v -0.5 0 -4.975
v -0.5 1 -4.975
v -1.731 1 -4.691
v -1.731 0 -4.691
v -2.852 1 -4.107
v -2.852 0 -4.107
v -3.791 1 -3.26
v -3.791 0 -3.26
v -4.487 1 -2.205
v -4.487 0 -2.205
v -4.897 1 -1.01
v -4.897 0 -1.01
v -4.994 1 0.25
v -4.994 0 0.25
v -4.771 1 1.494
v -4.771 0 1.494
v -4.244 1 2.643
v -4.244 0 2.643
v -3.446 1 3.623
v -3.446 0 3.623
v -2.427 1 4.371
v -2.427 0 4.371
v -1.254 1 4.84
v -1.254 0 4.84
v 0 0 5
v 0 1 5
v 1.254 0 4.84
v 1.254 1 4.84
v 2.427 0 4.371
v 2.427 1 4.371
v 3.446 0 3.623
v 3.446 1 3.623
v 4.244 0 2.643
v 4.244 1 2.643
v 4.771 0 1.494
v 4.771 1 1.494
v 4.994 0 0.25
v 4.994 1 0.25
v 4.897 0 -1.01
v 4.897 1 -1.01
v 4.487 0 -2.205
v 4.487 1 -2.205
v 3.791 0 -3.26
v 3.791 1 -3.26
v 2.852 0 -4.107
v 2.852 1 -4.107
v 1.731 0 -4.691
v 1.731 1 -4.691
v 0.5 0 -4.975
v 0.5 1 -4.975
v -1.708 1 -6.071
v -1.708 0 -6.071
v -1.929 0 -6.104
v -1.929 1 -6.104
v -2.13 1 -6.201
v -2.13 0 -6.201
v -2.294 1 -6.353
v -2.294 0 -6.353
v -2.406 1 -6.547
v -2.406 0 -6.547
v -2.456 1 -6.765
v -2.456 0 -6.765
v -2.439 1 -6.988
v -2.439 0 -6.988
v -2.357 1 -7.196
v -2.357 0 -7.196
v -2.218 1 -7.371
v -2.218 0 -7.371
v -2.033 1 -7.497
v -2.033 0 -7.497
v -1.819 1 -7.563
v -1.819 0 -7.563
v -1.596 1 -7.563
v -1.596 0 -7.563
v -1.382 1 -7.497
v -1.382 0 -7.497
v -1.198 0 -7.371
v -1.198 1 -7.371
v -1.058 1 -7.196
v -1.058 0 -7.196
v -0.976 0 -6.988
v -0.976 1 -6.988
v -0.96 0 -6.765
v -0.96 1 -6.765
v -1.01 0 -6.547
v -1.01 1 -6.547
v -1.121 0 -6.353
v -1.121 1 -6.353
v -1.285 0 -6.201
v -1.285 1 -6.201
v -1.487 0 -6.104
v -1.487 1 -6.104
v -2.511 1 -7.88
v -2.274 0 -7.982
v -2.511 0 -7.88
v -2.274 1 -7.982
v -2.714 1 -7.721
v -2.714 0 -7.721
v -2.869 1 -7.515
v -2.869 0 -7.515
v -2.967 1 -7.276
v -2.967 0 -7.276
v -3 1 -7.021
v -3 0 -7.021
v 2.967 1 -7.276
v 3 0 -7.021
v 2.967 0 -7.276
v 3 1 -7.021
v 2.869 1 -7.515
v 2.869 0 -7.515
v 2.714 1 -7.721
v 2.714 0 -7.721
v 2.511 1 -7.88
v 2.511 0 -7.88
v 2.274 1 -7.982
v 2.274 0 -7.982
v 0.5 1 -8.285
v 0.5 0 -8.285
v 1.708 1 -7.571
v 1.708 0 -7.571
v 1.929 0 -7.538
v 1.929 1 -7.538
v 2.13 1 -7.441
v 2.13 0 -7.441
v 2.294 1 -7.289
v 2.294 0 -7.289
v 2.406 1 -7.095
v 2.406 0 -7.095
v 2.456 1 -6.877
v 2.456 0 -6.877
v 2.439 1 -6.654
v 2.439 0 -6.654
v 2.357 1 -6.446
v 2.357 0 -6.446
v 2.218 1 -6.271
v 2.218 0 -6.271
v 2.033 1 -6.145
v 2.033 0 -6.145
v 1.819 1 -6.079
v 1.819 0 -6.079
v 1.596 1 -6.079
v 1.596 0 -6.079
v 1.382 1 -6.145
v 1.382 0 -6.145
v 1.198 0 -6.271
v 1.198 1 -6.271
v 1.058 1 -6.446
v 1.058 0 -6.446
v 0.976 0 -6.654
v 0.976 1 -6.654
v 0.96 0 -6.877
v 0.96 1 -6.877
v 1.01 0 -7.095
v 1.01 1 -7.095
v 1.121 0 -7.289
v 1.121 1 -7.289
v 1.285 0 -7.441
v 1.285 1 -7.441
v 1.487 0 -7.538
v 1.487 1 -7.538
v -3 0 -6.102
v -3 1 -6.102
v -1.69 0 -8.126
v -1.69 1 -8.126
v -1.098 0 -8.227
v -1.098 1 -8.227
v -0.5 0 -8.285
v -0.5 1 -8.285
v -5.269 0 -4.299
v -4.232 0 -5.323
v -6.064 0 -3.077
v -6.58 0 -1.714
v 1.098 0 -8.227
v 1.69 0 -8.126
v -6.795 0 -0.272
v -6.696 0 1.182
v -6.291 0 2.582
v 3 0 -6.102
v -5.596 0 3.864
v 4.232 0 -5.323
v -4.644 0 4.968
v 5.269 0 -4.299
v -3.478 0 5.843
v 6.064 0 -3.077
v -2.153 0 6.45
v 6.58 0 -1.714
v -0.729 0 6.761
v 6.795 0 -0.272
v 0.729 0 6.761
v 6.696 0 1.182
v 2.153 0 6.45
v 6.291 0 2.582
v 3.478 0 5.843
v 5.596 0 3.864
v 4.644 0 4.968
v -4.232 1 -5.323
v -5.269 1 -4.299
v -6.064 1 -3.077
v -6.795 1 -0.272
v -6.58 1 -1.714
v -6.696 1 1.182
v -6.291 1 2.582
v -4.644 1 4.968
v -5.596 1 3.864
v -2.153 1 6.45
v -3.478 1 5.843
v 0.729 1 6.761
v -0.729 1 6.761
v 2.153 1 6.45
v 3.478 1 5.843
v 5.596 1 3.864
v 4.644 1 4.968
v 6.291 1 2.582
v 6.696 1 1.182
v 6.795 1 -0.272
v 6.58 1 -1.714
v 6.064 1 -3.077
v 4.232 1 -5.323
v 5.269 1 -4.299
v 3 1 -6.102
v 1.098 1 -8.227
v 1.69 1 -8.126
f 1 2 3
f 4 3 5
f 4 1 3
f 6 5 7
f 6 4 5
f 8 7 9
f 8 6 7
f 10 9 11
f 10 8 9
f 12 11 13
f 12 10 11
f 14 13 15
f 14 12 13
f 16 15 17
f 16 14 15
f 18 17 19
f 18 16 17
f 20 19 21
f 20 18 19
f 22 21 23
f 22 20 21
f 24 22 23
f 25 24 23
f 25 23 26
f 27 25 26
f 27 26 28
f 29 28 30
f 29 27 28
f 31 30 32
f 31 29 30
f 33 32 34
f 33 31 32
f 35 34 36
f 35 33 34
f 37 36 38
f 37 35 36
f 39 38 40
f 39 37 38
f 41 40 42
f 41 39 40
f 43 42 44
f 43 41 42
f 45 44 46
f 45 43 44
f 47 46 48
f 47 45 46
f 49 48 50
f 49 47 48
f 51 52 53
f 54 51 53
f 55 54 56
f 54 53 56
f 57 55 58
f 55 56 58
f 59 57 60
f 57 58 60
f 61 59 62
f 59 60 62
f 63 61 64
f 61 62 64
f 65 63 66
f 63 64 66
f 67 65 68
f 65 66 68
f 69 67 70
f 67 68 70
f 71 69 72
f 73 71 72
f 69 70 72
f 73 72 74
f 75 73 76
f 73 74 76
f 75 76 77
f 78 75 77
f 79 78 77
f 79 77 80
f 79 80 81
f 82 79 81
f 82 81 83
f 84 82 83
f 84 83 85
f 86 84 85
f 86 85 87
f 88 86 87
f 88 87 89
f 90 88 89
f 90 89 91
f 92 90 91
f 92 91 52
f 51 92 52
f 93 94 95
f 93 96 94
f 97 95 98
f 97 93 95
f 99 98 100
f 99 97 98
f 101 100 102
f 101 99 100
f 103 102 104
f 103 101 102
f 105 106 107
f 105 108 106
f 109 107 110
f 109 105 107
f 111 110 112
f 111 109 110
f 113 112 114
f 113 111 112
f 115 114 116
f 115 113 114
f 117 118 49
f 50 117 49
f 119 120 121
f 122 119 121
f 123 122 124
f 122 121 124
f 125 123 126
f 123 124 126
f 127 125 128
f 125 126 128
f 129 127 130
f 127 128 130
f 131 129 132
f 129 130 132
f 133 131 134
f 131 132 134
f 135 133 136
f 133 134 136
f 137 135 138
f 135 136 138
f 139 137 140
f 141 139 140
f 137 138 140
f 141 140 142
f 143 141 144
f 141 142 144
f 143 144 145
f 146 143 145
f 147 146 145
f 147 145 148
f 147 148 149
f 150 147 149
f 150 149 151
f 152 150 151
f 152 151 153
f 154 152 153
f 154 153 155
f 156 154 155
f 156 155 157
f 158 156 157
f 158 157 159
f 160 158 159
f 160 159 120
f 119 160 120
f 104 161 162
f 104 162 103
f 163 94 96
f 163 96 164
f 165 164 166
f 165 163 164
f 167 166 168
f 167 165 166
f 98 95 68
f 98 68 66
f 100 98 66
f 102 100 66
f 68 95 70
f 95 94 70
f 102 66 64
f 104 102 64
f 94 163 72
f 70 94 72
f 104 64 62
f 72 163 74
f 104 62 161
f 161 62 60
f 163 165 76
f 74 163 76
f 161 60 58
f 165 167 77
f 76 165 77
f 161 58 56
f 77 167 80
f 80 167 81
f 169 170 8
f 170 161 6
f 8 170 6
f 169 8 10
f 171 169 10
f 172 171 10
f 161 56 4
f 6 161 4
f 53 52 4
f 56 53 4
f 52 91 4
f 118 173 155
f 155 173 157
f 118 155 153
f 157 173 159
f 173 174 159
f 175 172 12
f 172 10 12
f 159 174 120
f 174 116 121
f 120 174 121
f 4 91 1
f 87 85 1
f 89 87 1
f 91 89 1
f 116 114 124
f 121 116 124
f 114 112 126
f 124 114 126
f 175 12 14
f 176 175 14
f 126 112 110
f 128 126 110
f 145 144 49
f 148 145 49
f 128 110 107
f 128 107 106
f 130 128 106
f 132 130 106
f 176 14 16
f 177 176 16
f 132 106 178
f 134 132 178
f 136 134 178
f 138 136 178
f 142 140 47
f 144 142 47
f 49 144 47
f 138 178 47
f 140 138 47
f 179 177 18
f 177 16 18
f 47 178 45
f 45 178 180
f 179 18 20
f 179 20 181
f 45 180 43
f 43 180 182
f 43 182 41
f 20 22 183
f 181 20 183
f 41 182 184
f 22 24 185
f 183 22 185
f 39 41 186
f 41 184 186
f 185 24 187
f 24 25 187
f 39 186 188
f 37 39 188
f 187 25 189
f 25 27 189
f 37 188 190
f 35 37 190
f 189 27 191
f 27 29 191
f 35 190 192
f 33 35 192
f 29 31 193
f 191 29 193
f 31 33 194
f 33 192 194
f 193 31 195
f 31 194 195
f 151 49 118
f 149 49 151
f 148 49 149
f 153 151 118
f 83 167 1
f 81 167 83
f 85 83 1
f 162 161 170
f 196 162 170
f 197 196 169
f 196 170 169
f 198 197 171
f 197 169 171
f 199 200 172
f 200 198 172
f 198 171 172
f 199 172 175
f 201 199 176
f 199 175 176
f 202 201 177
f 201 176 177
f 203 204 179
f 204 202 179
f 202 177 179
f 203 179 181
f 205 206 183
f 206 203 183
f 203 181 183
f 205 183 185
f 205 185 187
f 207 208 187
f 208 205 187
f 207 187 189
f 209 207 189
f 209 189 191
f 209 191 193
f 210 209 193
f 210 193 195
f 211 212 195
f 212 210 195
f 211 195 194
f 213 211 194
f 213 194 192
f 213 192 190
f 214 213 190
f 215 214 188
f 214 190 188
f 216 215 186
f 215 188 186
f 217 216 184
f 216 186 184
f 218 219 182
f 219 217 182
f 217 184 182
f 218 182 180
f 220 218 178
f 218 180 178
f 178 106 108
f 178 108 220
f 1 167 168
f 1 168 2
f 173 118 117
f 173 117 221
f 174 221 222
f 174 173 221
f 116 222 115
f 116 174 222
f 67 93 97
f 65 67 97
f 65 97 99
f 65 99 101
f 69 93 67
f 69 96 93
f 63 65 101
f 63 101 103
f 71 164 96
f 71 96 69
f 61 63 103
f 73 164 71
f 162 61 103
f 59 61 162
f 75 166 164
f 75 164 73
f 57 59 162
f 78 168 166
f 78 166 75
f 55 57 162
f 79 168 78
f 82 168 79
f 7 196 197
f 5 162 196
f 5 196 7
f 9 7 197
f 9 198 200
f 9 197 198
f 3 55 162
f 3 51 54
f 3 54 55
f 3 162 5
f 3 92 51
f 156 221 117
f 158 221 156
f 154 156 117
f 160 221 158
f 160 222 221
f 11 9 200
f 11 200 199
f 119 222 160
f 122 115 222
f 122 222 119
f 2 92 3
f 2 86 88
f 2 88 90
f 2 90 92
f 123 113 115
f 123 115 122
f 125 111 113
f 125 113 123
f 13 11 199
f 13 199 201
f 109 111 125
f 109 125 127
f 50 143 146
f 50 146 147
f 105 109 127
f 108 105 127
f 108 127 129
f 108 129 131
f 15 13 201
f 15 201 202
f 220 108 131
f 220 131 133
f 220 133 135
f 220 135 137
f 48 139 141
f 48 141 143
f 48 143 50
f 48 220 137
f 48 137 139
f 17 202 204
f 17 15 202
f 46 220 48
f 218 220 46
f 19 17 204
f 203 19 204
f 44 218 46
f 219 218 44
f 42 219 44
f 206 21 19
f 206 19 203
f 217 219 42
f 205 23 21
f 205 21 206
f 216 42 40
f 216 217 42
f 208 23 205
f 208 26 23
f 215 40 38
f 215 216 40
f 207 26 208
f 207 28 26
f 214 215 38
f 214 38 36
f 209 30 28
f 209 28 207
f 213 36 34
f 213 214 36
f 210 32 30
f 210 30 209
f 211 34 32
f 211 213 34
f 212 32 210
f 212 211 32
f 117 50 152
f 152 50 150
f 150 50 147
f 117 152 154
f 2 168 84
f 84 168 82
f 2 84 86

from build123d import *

# Parameters (mm, degrees)
SKETCH1_R           = 6.8
SKETCH1_R_2         = 5
BOSS_EXTRUDE1_DEPTH = 1
BOSS_EXTRUDE2_DEPTH = 1
FILLET1_R           = 1
SKETCH3_W           = 1
SKETCH3_H           = 3.309988885
CUT_EXTRUDE1_DEPTH  = 11.764757313
SKETCH4_R           = 0.75
CUT_EXTRUDE2_DEPTH  = 11.764757313


with BuildPart() as part:
    # Sketch1 → Boss-Extrude1 (new body)
    with BuildSketch(Plane(origin=(0, 0, 0), x_dir=(1, 0, 0), z_dir=(0, 1, 0))):
        with Locations(Location((0, 0, 0), (0, 0, 270))):
            Circle(SKETCH1_R)
        with Locations(Location((0, 0, 0), (0, 0, 270))):
            Circle(SKETCH1_R_2, mode=Mode.SUBTRACT)
    extrude(amount=BOSS_EXTRUDE1_DEPTH)

    # Sketch2 → Boss-Extrude2 (add)
    with BuildSketch(Plane.XZ):
        with BuildLine():
            Line((3, -7.738862966), (3, -6.102458521))
            ThreePointArc((3, -6.102458521), (1.782640126, -6.562179073), (0.5, -6.781592733))
            Line((0.5, -6.781592733), (0.5, -8.284926071))
            ThreePointArc((0.5, -8.284926071), (1.771170864, -8.108819505), (3, -7.738862966))
        make_face()
        with BuildLine():
            Line((-0.5, -8.284926071), (-0.5, -6.781592733))
            ThreePointArc((-0.5, -6.781592733), (-1.782640126, -6.562179073), (-3, -6.102458521))
            Line((-3, -6.102458521), (-3, -7.738862966))
            ThreePointArc((-3, -7.738862966), (-1.771170864, -8.108819505), (-0.5, -8.284926071))
        make_face()
    extrude(amount=-BOSS_EXTRUDE2_DEPTH)

    # Fillet1
    fillet1_edges = [part.edges().sort_by_distance(p)[0] for p in [
        (3, 0.5, -7.738862966),
        (-3, 0.5, -7.738862966),
    ]]
    fillet(fillet1_edges, radius=FILLET1_R)

    # Sketch3 → Cut-Extrude1 (cut, through all)
    with BuildSketch(Plane.XZ):
        with Locations((0, -6.629931629)):
            Rectangle(SKETCH3_W, SKETCH3_H)
    extrude(amount=-CUT_EXTRUDE1_DEPTH, mode=Mode.SUBTRACT)

    # Sketch4 → Cut-Extrude2 (cut, through all)
    with BuildSketch(Plane.XZ):
        with Locations(Location((1.707693317, -6.821038057, 0), (0, 0, 270))):
            Circle(SKETCH4_R)
        with Locations(Location((-1.707693317, -6.821038057, 0), (0, 0, 90))):
            Circle(SKETCH4_R)
    extrude(amount=-CUT_EXTRUDE2_DEPTH, mode=Mode.SUBTRACT)


solid = part.part
